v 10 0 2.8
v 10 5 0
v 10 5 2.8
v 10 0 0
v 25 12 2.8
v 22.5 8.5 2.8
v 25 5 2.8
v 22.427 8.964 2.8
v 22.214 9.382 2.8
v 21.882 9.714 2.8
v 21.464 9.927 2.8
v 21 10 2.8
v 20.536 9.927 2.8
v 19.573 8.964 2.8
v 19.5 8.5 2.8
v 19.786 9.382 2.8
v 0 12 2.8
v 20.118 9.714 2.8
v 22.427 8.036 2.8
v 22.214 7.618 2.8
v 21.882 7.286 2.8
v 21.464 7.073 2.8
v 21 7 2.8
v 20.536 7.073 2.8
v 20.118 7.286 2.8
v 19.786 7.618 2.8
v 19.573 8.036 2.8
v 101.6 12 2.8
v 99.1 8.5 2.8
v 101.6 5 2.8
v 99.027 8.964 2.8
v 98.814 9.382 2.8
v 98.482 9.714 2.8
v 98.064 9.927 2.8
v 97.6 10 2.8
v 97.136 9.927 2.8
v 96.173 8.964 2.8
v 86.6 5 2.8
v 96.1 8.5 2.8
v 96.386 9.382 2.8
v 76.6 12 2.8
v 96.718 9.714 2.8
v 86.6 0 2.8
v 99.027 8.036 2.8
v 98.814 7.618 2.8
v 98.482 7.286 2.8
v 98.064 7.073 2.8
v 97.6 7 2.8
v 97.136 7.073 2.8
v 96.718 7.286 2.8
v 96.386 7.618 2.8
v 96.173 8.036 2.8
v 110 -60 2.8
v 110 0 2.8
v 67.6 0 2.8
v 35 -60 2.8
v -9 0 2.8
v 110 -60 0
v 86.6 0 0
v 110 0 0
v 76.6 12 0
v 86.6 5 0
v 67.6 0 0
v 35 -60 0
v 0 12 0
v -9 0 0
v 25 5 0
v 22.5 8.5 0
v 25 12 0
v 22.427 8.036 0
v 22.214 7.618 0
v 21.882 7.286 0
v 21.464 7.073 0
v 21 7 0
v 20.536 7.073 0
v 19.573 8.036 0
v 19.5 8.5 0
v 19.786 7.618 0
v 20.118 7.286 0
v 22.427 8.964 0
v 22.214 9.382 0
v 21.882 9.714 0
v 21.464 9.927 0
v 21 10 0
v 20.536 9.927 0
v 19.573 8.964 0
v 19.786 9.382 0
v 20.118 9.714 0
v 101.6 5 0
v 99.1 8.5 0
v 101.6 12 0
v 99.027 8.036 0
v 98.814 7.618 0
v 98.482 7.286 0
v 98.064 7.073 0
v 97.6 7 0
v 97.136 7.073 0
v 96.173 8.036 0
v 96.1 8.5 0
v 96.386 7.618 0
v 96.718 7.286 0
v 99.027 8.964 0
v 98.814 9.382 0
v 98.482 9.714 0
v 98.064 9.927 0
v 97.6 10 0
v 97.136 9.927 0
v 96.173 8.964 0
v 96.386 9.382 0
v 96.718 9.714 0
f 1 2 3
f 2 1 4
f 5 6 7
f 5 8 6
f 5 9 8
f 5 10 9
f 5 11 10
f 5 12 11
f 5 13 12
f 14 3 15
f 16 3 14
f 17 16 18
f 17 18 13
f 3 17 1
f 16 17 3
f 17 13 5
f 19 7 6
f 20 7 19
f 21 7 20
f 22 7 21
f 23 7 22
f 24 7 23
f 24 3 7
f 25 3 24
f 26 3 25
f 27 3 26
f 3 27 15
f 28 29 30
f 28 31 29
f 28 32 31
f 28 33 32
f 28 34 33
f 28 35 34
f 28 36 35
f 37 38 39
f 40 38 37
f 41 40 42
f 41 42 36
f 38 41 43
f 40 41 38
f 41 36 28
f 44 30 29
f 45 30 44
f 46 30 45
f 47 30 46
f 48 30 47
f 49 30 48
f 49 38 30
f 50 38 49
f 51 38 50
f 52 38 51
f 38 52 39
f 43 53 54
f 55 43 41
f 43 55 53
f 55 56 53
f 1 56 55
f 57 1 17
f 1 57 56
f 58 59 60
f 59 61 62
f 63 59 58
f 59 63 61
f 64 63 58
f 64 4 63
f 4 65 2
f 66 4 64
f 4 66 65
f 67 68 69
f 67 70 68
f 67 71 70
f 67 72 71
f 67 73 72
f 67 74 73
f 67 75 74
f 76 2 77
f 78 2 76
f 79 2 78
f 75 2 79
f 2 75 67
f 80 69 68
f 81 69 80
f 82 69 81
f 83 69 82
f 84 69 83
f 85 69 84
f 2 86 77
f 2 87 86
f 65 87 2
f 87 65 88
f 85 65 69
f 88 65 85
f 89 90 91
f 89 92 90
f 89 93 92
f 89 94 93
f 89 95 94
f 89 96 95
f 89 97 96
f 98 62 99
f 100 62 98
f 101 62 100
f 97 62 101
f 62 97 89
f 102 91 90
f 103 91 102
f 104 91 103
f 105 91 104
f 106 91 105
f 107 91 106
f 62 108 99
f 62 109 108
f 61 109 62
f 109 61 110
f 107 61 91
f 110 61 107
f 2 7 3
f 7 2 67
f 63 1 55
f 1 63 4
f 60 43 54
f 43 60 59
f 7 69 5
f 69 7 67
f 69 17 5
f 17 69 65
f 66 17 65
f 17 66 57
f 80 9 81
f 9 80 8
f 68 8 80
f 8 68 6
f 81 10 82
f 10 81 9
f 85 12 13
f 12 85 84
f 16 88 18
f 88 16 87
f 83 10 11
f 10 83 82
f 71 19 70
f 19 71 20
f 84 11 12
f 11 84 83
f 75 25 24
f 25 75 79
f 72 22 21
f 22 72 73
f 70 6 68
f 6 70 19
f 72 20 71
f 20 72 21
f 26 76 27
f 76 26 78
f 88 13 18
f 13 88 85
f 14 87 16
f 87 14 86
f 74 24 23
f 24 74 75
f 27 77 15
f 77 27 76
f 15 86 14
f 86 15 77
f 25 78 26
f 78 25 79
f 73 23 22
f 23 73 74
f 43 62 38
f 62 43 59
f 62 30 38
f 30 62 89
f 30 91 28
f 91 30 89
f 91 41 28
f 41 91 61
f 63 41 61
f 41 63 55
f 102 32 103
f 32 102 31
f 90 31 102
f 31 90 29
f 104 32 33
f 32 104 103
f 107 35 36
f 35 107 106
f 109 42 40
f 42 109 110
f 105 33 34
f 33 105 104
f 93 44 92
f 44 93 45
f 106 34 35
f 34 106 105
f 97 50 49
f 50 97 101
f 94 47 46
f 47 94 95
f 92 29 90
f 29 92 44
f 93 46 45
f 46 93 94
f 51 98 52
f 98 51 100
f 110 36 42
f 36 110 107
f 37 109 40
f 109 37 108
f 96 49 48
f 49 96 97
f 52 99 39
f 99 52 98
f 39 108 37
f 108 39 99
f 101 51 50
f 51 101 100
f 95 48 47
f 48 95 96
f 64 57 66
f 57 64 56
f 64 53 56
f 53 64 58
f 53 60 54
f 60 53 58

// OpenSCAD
$thickness = 2.8;

module hook(){
    difference(){
        union(){
            cube([10,5,$thickness]);
            translate([0,5,0])cube([25,7,$thickness]);
            
            
            linear_extrude(height = $thickness)
            polygon(points=
                    [[0,0],
                    [-9,0],
                    [0,12]]);
        }
        translate([10 + 11,5 + 7/2,-1])cylinder(d=3,20, $fn=20);
    }
}


union(){
    hook();
    translate([66.6 + 10,0,0])hook();

    linear_extrude(height = $thickness)
    polygon(points=
            [[-9,0],
            [35,-60],
            [110,-60],
            [110,0]]);
}
